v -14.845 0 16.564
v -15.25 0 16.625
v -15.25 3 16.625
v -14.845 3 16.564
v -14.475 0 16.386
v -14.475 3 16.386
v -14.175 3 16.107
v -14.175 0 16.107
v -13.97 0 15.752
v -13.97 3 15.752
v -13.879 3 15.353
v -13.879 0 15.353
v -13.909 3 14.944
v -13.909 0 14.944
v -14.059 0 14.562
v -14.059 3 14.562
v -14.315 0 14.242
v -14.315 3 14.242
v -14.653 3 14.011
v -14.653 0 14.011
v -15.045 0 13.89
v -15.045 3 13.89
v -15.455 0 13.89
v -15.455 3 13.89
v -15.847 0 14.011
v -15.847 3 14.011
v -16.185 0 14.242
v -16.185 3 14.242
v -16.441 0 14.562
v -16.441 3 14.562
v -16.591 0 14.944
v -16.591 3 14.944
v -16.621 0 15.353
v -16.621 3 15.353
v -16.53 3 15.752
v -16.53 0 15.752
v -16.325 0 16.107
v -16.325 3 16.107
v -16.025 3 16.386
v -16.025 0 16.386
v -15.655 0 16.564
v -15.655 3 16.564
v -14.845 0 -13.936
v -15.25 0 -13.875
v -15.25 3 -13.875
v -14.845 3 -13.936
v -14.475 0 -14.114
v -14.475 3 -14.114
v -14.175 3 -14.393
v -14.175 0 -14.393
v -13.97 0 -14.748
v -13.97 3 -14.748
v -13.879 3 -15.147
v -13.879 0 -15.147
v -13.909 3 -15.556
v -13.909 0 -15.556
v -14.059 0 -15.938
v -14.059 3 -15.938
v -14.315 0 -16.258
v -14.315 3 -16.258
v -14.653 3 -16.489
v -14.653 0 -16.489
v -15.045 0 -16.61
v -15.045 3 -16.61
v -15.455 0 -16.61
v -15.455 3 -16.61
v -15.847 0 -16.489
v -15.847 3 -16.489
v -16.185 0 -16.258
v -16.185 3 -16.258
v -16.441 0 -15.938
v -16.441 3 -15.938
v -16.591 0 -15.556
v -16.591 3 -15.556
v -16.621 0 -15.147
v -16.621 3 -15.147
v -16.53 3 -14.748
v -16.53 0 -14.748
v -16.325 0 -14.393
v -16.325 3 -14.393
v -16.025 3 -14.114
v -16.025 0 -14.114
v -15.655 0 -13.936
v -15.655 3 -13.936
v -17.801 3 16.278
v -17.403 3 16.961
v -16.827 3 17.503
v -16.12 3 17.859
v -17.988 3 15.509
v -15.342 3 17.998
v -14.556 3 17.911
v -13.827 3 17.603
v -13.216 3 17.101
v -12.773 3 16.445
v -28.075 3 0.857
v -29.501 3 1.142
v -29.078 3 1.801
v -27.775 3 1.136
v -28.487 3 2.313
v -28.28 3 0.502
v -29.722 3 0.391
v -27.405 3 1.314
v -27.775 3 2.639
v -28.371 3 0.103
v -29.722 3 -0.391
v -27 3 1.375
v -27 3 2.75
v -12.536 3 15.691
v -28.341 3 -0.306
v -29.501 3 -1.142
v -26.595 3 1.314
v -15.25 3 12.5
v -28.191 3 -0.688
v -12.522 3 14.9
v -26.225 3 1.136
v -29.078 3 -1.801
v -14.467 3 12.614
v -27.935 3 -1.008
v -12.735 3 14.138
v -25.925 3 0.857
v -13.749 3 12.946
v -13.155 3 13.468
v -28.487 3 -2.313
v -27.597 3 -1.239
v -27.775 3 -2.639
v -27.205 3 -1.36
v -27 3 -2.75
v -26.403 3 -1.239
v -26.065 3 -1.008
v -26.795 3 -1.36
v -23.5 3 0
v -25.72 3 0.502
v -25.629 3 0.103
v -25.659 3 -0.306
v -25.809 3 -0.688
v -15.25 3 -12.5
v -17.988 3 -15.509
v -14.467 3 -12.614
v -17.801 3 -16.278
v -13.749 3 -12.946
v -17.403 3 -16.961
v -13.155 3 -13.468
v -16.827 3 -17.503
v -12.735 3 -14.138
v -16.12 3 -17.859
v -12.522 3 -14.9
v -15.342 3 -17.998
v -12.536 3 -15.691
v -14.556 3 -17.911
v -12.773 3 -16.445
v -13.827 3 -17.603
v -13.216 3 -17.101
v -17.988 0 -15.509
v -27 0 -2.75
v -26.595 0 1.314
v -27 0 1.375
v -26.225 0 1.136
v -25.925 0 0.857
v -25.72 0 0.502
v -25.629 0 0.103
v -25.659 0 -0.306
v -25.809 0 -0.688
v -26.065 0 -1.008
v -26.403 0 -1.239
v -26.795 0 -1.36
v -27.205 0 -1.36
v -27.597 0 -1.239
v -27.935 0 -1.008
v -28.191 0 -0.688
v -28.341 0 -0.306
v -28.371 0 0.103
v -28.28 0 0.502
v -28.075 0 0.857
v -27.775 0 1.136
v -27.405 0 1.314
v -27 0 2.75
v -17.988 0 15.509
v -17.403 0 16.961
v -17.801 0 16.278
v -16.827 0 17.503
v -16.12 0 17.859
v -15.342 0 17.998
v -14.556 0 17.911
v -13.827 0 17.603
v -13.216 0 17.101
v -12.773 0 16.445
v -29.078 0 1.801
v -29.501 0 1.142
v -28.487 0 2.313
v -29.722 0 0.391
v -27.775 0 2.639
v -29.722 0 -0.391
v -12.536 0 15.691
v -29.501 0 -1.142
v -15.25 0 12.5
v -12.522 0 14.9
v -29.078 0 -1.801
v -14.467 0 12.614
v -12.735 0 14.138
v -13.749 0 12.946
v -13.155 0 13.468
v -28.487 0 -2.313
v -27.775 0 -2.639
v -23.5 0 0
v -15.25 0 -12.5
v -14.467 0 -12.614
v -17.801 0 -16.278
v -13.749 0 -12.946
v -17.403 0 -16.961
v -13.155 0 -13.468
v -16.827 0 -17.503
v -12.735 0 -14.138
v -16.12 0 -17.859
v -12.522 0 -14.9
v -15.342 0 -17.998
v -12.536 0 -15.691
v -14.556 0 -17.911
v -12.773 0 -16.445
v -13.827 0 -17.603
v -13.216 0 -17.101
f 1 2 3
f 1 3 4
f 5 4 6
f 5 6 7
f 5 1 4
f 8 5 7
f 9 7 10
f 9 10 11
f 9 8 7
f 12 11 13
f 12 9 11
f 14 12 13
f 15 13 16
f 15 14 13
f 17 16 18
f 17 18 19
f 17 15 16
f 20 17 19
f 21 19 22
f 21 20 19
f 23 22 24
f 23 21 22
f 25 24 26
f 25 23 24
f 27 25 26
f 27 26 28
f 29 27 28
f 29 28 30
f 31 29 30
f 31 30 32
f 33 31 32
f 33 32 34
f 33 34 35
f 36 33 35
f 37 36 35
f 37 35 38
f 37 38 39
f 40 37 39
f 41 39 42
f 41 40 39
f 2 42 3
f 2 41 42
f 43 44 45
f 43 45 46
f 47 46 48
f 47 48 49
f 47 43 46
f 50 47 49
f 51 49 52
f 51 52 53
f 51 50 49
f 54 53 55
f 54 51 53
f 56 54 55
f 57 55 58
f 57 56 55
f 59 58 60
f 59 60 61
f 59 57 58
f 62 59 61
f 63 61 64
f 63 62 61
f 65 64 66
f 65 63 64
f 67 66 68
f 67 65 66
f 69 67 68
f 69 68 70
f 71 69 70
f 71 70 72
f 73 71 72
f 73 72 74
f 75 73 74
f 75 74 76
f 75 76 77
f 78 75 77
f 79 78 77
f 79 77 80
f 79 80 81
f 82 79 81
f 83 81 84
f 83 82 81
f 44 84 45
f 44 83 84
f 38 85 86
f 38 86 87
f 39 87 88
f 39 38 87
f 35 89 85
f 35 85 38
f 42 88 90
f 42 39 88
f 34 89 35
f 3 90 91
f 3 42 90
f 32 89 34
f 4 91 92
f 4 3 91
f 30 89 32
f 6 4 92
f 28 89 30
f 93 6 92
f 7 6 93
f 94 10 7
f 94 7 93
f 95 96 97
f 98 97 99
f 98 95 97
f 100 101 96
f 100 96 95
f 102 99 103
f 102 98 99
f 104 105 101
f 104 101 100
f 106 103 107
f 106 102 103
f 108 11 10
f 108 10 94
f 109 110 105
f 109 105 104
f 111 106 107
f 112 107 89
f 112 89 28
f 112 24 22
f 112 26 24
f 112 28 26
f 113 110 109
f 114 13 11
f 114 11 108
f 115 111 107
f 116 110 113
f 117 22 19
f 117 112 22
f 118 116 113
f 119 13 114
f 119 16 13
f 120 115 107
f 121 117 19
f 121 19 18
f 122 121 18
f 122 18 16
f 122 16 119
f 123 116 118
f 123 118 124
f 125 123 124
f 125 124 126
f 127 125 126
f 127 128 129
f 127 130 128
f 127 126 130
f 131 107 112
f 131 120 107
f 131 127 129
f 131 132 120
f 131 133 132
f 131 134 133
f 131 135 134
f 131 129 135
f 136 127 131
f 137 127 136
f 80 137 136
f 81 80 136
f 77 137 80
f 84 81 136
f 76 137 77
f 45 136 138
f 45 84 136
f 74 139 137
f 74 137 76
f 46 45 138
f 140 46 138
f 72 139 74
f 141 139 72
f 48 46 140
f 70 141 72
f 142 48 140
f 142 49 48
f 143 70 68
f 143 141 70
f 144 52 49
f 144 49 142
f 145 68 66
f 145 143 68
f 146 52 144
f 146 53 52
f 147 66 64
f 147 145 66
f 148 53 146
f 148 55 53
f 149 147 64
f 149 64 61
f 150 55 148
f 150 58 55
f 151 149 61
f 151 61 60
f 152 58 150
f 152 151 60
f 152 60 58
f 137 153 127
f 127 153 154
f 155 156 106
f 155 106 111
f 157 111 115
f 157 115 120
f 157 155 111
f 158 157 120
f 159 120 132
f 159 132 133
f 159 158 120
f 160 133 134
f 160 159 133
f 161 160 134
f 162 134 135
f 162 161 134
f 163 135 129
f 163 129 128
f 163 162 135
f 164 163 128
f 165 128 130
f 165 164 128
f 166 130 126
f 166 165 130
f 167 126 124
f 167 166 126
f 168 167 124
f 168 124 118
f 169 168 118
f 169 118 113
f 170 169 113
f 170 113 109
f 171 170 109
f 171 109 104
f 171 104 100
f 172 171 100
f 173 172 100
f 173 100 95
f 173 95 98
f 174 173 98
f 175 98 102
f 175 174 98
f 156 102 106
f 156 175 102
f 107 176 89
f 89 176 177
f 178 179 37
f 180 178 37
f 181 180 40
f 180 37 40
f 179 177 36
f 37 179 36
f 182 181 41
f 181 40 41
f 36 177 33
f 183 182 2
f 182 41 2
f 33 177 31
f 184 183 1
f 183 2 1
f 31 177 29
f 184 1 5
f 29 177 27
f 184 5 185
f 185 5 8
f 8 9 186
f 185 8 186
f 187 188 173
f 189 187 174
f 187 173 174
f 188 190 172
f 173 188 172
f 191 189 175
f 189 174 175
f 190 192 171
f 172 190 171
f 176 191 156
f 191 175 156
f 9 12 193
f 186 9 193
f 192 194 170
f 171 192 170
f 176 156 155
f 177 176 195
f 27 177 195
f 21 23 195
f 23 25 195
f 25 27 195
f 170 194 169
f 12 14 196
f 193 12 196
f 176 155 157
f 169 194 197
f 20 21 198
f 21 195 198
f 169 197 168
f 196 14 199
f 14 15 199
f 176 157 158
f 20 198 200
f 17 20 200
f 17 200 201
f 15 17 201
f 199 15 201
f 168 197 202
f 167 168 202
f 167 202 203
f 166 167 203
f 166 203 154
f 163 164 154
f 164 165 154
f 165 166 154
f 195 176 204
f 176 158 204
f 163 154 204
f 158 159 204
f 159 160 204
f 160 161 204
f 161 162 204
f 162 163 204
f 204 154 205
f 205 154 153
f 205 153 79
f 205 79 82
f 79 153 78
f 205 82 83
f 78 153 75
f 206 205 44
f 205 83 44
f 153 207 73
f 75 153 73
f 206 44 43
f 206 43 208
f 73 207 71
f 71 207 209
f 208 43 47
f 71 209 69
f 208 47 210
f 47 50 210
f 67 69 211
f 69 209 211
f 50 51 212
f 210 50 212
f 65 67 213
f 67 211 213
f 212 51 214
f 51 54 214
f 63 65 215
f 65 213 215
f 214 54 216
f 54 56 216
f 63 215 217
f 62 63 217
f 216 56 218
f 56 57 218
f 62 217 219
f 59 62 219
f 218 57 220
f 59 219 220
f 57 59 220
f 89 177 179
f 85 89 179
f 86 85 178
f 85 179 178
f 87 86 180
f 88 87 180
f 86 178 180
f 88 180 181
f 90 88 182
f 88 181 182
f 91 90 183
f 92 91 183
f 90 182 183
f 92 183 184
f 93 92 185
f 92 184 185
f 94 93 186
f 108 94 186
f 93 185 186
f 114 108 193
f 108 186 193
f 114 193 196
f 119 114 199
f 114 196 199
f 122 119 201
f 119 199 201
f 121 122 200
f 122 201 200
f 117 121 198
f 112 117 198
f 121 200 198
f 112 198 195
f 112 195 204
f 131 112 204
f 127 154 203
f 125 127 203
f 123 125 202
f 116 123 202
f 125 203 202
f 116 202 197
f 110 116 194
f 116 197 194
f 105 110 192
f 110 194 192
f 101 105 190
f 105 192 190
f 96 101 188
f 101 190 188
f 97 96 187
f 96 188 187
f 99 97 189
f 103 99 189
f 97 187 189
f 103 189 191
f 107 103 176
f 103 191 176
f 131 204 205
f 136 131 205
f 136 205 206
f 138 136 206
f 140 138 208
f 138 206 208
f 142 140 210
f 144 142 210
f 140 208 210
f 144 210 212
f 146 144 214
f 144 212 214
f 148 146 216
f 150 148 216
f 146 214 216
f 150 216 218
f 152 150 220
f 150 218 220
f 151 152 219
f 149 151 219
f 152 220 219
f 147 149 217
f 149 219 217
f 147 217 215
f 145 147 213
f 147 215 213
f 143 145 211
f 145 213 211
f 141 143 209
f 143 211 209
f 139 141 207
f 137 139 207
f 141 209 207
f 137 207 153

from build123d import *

# Parameters (mm, degrees)
SKETCH2_R           = 1.375
BOSS_EXTRUDE1_DEPTH = 3


with BuildPart() as part:
    # Sketch2 → Boss-Extrude1 (new body)
    with BuildSketch(Plane(origin=(0, 0, 0), x_dir=(1, 0, 0), z_dir=(0, 1, 0))):
        with BuildLine():
            Line((-27, -2.75), (-17.987773433, -15.509030166))
            ThreePointArc((-17.987773433, -15.509030166), (-13.21593597, -17.100698117), (-15.25, -12.5))
            Line((-15.25, -12.5), (-23.5, 0))
            Line((-23.5, 0), (-15.25, 12.5))
            ThreePointArc((-15.25, 12.5), (-13.21593597, 17.100698117), (-17.987773433, 15.509030166))
            Line((-17.987773433, 15.509030166), (-27, 2.75))
            ThreePointArc((-27, 2.75), (-29.75, 0), (-27, -2.75))
        make_face()
        with Locations(Location((-27, 0, 0), (0, 0, 270))):
            Circle(SKETCH2_R, mode=Mode.SUBTRACT)
        with Locations(Location((-15.25, 15.25, 0), (0, 0, 270))):
            Circle(SKETCH2_R, mode=Mode.SUBTRACT)
        with Locations(Location((-15.25, -15.25, 0), (0, 0, 270))):
            Circle(SKETCH2_R, mode=Mode.SUBTRACT)
    extrude(amount=BOSS_EXTRUDE1_DEPTH)


solid = part.part
